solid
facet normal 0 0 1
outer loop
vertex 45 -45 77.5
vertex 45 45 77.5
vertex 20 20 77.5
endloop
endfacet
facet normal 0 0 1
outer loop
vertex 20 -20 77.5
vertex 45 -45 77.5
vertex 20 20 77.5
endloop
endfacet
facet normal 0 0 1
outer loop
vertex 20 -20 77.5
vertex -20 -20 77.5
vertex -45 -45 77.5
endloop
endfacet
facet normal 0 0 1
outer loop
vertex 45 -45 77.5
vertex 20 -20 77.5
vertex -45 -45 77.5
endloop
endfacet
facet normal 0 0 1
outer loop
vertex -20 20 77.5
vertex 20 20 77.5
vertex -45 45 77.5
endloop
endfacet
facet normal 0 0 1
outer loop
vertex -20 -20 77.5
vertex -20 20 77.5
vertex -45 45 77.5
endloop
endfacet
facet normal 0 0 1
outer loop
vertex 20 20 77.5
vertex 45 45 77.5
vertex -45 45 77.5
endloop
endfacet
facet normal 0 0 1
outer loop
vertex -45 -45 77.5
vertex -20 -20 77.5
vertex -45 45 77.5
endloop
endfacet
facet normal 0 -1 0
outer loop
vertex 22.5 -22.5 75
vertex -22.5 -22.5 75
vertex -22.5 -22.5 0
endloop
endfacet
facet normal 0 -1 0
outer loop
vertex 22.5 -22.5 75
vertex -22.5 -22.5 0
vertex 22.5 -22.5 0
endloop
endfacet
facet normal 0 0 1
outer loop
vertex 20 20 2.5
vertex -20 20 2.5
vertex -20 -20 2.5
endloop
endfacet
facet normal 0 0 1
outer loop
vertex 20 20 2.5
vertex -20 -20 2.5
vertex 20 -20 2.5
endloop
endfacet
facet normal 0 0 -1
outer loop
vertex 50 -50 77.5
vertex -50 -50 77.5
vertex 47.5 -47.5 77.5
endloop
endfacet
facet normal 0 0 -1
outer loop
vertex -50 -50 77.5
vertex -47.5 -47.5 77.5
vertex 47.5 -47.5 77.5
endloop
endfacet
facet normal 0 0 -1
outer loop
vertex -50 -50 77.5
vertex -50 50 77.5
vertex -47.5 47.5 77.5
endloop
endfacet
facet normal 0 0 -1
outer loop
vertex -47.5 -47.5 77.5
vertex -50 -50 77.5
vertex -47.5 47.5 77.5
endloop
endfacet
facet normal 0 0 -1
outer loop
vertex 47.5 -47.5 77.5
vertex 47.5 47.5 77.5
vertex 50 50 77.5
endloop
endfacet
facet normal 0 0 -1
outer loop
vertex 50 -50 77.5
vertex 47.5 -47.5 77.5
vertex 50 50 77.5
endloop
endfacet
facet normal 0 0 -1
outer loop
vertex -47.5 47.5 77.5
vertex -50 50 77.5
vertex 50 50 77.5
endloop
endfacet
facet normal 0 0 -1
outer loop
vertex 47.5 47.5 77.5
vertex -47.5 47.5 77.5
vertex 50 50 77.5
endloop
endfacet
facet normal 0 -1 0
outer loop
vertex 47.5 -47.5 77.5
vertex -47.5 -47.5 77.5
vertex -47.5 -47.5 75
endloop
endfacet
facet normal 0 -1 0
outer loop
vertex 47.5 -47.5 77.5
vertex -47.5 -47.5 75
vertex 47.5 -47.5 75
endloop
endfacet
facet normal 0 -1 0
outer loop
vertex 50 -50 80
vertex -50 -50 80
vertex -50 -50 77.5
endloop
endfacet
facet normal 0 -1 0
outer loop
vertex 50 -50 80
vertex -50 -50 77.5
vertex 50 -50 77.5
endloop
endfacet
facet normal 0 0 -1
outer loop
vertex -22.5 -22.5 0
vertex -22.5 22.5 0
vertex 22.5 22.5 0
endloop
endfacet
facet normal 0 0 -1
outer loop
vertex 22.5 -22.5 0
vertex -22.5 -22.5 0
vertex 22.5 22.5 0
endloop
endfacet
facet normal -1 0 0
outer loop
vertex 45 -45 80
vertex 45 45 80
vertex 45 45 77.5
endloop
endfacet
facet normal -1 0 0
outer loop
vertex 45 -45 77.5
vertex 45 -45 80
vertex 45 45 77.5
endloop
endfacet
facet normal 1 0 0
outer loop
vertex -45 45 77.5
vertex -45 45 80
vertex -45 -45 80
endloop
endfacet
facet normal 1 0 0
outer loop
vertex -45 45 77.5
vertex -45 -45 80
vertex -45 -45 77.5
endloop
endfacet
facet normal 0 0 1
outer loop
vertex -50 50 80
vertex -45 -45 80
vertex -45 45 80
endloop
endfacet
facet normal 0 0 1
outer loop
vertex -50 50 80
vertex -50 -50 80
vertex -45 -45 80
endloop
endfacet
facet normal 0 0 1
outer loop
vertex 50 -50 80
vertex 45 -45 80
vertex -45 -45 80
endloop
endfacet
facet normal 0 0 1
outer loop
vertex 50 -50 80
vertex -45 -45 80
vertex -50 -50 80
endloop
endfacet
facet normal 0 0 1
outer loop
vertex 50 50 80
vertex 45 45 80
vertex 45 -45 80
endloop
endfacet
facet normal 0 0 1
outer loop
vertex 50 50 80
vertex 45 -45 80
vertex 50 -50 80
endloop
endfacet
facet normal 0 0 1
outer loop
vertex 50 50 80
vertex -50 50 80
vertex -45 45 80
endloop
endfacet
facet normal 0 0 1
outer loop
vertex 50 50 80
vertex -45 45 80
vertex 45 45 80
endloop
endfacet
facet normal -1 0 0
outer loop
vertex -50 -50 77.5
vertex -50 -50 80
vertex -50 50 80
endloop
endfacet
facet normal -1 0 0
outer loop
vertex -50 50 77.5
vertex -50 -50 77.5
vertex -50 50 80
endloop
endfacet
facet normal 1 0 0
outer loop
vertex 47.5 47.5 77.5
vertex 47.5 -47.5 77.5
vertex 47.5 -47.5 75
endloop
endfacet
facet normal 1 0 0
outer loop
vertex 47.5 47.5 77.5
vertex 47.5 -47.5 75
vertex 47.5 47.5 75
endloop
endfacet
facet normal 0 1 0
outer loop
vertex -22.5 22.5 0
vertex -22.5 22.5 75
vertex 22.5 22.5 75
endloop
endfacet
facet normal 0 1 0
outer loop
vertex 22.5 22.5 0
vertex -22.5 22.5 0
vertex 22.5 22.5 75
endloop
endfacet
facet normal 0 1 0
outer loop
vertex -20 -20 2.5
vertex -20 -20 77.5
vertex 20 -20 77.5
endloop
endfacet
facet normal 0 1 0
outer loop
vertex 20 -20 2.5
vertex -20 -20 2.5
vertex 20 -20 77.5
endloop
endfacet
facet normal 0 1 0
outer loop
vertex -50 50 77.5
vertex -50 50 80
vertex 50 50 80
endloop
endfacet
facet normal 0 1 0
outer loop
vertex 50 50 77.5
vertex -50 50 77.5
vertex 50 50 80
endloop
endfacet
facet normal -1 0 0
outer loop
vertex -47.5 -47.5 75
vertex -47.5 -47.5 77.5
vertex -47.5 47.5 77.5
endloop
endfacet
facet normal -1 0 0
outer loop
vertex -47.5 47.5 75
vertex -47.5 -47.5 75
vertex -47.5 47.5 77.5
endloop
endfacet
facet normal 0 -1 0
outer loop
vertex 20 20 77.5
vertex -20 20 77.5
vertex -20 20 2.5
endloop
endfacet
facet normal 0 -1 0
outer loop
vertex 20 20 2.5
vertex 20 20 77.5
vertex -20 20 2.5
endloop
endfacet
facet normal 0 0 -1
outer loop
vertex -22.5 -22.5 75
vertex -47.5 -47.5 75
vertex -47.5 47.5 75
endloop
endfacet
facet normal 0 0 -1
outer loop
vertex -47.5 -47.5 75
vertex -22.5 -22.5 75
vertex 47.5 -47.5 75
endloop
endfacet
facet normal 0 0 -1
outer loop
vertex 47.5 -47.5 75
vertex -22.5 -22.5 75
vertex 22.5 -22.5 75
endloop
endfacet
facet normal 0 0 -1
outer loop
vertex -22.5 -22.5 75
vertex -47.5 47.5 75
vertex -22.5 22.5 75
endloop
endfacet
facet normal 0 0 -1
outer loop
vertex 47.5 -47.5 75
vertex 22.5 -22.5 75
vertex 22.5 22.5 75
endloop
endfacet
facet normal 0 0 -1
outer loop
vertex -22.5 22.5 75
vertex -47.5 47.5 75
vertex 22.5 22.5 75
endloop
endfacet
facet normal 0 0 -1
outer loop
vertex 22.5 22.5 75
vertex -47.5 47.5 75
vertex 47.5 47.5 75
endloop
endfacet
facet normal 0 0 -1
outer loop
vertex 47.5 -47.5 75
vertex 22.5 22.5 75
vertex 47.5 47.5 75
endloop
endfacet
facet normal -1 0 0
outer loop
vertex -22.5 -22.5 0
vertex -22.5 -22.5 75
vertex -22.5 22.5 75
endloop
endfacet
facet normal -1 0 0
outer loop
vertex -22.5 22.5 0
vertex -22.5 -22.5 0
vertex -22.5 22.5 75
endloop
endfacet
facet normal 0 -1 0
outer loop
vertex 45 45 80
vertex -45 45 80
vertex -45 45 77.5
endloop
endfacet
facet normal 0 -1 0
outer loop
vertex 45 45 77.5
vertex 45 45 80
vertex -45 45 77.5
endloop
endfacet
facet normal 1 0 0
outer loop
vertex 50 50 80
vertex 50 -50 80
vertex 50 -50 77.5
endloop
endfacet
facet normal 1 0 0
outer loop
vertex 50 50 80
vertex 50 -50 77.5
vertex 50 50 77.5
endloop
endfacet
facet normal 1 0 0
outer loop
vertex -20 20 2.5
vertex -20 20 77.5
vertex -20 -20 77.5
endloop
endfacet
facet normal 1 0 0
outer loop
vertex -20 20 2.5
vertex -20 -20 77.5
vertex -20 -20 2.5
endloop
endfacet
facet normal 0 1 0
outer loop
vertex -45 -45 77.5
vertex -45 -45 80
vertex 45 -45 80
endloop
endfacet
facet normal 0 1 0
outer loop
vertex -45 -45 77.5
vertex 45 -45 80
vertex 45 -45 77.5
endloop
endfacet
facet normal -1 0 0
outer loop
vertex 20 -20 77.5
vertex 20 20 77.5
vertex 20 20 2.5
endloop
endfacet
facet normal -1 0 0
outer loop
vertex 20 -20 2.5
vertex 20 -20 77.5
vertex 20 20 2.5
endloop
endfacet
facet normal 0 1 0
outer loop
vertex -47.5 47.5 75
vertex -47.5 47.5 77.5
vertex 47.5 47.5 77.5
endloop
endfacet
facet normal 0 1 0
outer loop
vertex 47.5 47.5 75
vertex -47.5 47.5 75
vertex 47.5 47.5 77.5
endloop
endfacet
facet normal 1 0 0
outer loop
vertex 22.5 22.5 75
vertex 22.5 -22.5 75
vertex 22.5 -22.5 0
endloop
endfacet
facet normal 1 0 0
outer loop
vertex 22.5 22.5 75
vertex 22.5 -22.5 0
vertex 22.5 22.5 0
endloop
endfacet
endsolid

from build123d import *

# Parameters (mm, degrees)
F1_W        = 100
F1_H        = 100
F2_DEPTH    = 2.5
F4_W        = 95
F4_H        = 95
F5_DEPTH    = 2.5
F7_W        = 45
F7_H        = 45
F8_DEPTH    = 75
F9_T        = 2.5
F9_T3_DEPTH = 100
F9_T5_DEPTH = 100
F9_T7_DEPTH = 50
F9_T9_DEPTH = 50


# Not quite as in the source:
# - a shell that OpenCascade refuses in one call is made with other operations: the cavity is built on its own and cut out


with BuildPart() as f2:
    # F1 (on offset) → F2 (new body)
    with BuildSketch(Plane.XY.offset(80)):
        Rectangle(F1_W, F1_H)
    extrude(amount=-F2_DEPTH)

    # F4 (on offset) → F5 (join)
    with BuildSketch(Plane.XY.offset(77.5)):
        Rectangle(F4_W, F4_H)
    extrude(amount=-F5_DEPTH)

    # F7 (on offset) → F8 (join)
    with BuildSketch(Plane.XY.offset(75)):
        Rectangle(F7_W, F7_H)
    extrude(amount=-F8_DEPTH)

    # F9: shell of thickness 2.5, made by hand


with BuildPart() as f9_core1:
    # F9_t2: copy of F2
    add(f2.part)

    # the walls: a layer under each face that stays
    f9_faces = [f9_core1.faces().sort_by_distance(p)[0] for p in [
        (0, 50, 78.75),
        (50, 0, 78.75),
        (-50, 0, 78.75),
        (34.375, -48.7654320988, 77.5),
        (0, -50, 78.75),
        (-47.5, 0, 76.25),
        (0, -47.5, 76.25),
        (47.5, 0, 76.25),
        (0, 47.5, 76.25),
        (-31.6666666667, -31.6666666667, 75),
        (-22.5, 0, 37.5),
        (0, -22.5, 37.5),
        (22.5, 0, 37.5),
        (0, 22.5, 37.5),
        (0, 0, 0),
    ]]
    thicken(f9_faces, amount=-F9_T, mode=Mode.SUBTRACT)

    # F9_s4 → F9_t3 (cut)
    with BuildSketch(Plane.XZ.offset(-50)):
        Polygon((-47.525, 77.475), (-47.5, 80), (-45, 80), (-45, 77.5), align=None)
        Polygon((47.525, 77.475), (47.5, 80), (45, 80), (45, 77.5), align=None)
    extrude(amount=F9_T3_DEPTH, mode=Mode.SUBTRACT)

    # F9_s6 → F9_t5 (cut)
    with BuildSketch(Plane.YZ.offset(-50)):
        Polygon((-47.525, 77.475), (-47.5, 80), (-45, 80), (-45, 77.5), align=None)
        Polygon((47.525, 77.475), (47.5, 80), (45, 80), (45, 77.5), align=None)
    extrude(amount=F9_T5_DEPTH, mode=Mode.SUBTRACT)

    # F9_s8 → F9_t7 (cut)
    with BuildSketch(Plane.XZ.offset(-25)):
        Polygon((-22.525, 74.975), (-22.5, 77.5), (-20, 77.5), (-20, 75), align=None)
        Polygon((22.525, 74.975), (22.5, 77.5), (20, 77.5), (20, 75), align=None)
    extrude(amount=F9_T7_DEPTH, mode=Mode.SUBTRACT)

    # F9_s10 → F9_t9 (cut)
    with BuildSketch(Plane.YZ.offset(-25)):
        Polygon((-22.525, 74.975), (-22.5, 77.5), (-20, 77.5), (-20, 75), align=None)
        Polygon((22.525, 74.975), (22.5, 77.5), (20, 77.5), (20, 75), align=None)
    extrude(amount=F9_T9_DEPTH, mode=Mode.SUBTRACT)


with BuildPart() as f2_1:
    add(f2.part)

    # what is left inside the walls is the cavity
    f9_cavity = [f9_core1.part.solids().sort_by_distance(p)[0] for p in [
        (0, -15, 79.975),
    ]]
    add(f9_cavity, mode=Mode.SUBTRACT)


solid = f2_1.part
